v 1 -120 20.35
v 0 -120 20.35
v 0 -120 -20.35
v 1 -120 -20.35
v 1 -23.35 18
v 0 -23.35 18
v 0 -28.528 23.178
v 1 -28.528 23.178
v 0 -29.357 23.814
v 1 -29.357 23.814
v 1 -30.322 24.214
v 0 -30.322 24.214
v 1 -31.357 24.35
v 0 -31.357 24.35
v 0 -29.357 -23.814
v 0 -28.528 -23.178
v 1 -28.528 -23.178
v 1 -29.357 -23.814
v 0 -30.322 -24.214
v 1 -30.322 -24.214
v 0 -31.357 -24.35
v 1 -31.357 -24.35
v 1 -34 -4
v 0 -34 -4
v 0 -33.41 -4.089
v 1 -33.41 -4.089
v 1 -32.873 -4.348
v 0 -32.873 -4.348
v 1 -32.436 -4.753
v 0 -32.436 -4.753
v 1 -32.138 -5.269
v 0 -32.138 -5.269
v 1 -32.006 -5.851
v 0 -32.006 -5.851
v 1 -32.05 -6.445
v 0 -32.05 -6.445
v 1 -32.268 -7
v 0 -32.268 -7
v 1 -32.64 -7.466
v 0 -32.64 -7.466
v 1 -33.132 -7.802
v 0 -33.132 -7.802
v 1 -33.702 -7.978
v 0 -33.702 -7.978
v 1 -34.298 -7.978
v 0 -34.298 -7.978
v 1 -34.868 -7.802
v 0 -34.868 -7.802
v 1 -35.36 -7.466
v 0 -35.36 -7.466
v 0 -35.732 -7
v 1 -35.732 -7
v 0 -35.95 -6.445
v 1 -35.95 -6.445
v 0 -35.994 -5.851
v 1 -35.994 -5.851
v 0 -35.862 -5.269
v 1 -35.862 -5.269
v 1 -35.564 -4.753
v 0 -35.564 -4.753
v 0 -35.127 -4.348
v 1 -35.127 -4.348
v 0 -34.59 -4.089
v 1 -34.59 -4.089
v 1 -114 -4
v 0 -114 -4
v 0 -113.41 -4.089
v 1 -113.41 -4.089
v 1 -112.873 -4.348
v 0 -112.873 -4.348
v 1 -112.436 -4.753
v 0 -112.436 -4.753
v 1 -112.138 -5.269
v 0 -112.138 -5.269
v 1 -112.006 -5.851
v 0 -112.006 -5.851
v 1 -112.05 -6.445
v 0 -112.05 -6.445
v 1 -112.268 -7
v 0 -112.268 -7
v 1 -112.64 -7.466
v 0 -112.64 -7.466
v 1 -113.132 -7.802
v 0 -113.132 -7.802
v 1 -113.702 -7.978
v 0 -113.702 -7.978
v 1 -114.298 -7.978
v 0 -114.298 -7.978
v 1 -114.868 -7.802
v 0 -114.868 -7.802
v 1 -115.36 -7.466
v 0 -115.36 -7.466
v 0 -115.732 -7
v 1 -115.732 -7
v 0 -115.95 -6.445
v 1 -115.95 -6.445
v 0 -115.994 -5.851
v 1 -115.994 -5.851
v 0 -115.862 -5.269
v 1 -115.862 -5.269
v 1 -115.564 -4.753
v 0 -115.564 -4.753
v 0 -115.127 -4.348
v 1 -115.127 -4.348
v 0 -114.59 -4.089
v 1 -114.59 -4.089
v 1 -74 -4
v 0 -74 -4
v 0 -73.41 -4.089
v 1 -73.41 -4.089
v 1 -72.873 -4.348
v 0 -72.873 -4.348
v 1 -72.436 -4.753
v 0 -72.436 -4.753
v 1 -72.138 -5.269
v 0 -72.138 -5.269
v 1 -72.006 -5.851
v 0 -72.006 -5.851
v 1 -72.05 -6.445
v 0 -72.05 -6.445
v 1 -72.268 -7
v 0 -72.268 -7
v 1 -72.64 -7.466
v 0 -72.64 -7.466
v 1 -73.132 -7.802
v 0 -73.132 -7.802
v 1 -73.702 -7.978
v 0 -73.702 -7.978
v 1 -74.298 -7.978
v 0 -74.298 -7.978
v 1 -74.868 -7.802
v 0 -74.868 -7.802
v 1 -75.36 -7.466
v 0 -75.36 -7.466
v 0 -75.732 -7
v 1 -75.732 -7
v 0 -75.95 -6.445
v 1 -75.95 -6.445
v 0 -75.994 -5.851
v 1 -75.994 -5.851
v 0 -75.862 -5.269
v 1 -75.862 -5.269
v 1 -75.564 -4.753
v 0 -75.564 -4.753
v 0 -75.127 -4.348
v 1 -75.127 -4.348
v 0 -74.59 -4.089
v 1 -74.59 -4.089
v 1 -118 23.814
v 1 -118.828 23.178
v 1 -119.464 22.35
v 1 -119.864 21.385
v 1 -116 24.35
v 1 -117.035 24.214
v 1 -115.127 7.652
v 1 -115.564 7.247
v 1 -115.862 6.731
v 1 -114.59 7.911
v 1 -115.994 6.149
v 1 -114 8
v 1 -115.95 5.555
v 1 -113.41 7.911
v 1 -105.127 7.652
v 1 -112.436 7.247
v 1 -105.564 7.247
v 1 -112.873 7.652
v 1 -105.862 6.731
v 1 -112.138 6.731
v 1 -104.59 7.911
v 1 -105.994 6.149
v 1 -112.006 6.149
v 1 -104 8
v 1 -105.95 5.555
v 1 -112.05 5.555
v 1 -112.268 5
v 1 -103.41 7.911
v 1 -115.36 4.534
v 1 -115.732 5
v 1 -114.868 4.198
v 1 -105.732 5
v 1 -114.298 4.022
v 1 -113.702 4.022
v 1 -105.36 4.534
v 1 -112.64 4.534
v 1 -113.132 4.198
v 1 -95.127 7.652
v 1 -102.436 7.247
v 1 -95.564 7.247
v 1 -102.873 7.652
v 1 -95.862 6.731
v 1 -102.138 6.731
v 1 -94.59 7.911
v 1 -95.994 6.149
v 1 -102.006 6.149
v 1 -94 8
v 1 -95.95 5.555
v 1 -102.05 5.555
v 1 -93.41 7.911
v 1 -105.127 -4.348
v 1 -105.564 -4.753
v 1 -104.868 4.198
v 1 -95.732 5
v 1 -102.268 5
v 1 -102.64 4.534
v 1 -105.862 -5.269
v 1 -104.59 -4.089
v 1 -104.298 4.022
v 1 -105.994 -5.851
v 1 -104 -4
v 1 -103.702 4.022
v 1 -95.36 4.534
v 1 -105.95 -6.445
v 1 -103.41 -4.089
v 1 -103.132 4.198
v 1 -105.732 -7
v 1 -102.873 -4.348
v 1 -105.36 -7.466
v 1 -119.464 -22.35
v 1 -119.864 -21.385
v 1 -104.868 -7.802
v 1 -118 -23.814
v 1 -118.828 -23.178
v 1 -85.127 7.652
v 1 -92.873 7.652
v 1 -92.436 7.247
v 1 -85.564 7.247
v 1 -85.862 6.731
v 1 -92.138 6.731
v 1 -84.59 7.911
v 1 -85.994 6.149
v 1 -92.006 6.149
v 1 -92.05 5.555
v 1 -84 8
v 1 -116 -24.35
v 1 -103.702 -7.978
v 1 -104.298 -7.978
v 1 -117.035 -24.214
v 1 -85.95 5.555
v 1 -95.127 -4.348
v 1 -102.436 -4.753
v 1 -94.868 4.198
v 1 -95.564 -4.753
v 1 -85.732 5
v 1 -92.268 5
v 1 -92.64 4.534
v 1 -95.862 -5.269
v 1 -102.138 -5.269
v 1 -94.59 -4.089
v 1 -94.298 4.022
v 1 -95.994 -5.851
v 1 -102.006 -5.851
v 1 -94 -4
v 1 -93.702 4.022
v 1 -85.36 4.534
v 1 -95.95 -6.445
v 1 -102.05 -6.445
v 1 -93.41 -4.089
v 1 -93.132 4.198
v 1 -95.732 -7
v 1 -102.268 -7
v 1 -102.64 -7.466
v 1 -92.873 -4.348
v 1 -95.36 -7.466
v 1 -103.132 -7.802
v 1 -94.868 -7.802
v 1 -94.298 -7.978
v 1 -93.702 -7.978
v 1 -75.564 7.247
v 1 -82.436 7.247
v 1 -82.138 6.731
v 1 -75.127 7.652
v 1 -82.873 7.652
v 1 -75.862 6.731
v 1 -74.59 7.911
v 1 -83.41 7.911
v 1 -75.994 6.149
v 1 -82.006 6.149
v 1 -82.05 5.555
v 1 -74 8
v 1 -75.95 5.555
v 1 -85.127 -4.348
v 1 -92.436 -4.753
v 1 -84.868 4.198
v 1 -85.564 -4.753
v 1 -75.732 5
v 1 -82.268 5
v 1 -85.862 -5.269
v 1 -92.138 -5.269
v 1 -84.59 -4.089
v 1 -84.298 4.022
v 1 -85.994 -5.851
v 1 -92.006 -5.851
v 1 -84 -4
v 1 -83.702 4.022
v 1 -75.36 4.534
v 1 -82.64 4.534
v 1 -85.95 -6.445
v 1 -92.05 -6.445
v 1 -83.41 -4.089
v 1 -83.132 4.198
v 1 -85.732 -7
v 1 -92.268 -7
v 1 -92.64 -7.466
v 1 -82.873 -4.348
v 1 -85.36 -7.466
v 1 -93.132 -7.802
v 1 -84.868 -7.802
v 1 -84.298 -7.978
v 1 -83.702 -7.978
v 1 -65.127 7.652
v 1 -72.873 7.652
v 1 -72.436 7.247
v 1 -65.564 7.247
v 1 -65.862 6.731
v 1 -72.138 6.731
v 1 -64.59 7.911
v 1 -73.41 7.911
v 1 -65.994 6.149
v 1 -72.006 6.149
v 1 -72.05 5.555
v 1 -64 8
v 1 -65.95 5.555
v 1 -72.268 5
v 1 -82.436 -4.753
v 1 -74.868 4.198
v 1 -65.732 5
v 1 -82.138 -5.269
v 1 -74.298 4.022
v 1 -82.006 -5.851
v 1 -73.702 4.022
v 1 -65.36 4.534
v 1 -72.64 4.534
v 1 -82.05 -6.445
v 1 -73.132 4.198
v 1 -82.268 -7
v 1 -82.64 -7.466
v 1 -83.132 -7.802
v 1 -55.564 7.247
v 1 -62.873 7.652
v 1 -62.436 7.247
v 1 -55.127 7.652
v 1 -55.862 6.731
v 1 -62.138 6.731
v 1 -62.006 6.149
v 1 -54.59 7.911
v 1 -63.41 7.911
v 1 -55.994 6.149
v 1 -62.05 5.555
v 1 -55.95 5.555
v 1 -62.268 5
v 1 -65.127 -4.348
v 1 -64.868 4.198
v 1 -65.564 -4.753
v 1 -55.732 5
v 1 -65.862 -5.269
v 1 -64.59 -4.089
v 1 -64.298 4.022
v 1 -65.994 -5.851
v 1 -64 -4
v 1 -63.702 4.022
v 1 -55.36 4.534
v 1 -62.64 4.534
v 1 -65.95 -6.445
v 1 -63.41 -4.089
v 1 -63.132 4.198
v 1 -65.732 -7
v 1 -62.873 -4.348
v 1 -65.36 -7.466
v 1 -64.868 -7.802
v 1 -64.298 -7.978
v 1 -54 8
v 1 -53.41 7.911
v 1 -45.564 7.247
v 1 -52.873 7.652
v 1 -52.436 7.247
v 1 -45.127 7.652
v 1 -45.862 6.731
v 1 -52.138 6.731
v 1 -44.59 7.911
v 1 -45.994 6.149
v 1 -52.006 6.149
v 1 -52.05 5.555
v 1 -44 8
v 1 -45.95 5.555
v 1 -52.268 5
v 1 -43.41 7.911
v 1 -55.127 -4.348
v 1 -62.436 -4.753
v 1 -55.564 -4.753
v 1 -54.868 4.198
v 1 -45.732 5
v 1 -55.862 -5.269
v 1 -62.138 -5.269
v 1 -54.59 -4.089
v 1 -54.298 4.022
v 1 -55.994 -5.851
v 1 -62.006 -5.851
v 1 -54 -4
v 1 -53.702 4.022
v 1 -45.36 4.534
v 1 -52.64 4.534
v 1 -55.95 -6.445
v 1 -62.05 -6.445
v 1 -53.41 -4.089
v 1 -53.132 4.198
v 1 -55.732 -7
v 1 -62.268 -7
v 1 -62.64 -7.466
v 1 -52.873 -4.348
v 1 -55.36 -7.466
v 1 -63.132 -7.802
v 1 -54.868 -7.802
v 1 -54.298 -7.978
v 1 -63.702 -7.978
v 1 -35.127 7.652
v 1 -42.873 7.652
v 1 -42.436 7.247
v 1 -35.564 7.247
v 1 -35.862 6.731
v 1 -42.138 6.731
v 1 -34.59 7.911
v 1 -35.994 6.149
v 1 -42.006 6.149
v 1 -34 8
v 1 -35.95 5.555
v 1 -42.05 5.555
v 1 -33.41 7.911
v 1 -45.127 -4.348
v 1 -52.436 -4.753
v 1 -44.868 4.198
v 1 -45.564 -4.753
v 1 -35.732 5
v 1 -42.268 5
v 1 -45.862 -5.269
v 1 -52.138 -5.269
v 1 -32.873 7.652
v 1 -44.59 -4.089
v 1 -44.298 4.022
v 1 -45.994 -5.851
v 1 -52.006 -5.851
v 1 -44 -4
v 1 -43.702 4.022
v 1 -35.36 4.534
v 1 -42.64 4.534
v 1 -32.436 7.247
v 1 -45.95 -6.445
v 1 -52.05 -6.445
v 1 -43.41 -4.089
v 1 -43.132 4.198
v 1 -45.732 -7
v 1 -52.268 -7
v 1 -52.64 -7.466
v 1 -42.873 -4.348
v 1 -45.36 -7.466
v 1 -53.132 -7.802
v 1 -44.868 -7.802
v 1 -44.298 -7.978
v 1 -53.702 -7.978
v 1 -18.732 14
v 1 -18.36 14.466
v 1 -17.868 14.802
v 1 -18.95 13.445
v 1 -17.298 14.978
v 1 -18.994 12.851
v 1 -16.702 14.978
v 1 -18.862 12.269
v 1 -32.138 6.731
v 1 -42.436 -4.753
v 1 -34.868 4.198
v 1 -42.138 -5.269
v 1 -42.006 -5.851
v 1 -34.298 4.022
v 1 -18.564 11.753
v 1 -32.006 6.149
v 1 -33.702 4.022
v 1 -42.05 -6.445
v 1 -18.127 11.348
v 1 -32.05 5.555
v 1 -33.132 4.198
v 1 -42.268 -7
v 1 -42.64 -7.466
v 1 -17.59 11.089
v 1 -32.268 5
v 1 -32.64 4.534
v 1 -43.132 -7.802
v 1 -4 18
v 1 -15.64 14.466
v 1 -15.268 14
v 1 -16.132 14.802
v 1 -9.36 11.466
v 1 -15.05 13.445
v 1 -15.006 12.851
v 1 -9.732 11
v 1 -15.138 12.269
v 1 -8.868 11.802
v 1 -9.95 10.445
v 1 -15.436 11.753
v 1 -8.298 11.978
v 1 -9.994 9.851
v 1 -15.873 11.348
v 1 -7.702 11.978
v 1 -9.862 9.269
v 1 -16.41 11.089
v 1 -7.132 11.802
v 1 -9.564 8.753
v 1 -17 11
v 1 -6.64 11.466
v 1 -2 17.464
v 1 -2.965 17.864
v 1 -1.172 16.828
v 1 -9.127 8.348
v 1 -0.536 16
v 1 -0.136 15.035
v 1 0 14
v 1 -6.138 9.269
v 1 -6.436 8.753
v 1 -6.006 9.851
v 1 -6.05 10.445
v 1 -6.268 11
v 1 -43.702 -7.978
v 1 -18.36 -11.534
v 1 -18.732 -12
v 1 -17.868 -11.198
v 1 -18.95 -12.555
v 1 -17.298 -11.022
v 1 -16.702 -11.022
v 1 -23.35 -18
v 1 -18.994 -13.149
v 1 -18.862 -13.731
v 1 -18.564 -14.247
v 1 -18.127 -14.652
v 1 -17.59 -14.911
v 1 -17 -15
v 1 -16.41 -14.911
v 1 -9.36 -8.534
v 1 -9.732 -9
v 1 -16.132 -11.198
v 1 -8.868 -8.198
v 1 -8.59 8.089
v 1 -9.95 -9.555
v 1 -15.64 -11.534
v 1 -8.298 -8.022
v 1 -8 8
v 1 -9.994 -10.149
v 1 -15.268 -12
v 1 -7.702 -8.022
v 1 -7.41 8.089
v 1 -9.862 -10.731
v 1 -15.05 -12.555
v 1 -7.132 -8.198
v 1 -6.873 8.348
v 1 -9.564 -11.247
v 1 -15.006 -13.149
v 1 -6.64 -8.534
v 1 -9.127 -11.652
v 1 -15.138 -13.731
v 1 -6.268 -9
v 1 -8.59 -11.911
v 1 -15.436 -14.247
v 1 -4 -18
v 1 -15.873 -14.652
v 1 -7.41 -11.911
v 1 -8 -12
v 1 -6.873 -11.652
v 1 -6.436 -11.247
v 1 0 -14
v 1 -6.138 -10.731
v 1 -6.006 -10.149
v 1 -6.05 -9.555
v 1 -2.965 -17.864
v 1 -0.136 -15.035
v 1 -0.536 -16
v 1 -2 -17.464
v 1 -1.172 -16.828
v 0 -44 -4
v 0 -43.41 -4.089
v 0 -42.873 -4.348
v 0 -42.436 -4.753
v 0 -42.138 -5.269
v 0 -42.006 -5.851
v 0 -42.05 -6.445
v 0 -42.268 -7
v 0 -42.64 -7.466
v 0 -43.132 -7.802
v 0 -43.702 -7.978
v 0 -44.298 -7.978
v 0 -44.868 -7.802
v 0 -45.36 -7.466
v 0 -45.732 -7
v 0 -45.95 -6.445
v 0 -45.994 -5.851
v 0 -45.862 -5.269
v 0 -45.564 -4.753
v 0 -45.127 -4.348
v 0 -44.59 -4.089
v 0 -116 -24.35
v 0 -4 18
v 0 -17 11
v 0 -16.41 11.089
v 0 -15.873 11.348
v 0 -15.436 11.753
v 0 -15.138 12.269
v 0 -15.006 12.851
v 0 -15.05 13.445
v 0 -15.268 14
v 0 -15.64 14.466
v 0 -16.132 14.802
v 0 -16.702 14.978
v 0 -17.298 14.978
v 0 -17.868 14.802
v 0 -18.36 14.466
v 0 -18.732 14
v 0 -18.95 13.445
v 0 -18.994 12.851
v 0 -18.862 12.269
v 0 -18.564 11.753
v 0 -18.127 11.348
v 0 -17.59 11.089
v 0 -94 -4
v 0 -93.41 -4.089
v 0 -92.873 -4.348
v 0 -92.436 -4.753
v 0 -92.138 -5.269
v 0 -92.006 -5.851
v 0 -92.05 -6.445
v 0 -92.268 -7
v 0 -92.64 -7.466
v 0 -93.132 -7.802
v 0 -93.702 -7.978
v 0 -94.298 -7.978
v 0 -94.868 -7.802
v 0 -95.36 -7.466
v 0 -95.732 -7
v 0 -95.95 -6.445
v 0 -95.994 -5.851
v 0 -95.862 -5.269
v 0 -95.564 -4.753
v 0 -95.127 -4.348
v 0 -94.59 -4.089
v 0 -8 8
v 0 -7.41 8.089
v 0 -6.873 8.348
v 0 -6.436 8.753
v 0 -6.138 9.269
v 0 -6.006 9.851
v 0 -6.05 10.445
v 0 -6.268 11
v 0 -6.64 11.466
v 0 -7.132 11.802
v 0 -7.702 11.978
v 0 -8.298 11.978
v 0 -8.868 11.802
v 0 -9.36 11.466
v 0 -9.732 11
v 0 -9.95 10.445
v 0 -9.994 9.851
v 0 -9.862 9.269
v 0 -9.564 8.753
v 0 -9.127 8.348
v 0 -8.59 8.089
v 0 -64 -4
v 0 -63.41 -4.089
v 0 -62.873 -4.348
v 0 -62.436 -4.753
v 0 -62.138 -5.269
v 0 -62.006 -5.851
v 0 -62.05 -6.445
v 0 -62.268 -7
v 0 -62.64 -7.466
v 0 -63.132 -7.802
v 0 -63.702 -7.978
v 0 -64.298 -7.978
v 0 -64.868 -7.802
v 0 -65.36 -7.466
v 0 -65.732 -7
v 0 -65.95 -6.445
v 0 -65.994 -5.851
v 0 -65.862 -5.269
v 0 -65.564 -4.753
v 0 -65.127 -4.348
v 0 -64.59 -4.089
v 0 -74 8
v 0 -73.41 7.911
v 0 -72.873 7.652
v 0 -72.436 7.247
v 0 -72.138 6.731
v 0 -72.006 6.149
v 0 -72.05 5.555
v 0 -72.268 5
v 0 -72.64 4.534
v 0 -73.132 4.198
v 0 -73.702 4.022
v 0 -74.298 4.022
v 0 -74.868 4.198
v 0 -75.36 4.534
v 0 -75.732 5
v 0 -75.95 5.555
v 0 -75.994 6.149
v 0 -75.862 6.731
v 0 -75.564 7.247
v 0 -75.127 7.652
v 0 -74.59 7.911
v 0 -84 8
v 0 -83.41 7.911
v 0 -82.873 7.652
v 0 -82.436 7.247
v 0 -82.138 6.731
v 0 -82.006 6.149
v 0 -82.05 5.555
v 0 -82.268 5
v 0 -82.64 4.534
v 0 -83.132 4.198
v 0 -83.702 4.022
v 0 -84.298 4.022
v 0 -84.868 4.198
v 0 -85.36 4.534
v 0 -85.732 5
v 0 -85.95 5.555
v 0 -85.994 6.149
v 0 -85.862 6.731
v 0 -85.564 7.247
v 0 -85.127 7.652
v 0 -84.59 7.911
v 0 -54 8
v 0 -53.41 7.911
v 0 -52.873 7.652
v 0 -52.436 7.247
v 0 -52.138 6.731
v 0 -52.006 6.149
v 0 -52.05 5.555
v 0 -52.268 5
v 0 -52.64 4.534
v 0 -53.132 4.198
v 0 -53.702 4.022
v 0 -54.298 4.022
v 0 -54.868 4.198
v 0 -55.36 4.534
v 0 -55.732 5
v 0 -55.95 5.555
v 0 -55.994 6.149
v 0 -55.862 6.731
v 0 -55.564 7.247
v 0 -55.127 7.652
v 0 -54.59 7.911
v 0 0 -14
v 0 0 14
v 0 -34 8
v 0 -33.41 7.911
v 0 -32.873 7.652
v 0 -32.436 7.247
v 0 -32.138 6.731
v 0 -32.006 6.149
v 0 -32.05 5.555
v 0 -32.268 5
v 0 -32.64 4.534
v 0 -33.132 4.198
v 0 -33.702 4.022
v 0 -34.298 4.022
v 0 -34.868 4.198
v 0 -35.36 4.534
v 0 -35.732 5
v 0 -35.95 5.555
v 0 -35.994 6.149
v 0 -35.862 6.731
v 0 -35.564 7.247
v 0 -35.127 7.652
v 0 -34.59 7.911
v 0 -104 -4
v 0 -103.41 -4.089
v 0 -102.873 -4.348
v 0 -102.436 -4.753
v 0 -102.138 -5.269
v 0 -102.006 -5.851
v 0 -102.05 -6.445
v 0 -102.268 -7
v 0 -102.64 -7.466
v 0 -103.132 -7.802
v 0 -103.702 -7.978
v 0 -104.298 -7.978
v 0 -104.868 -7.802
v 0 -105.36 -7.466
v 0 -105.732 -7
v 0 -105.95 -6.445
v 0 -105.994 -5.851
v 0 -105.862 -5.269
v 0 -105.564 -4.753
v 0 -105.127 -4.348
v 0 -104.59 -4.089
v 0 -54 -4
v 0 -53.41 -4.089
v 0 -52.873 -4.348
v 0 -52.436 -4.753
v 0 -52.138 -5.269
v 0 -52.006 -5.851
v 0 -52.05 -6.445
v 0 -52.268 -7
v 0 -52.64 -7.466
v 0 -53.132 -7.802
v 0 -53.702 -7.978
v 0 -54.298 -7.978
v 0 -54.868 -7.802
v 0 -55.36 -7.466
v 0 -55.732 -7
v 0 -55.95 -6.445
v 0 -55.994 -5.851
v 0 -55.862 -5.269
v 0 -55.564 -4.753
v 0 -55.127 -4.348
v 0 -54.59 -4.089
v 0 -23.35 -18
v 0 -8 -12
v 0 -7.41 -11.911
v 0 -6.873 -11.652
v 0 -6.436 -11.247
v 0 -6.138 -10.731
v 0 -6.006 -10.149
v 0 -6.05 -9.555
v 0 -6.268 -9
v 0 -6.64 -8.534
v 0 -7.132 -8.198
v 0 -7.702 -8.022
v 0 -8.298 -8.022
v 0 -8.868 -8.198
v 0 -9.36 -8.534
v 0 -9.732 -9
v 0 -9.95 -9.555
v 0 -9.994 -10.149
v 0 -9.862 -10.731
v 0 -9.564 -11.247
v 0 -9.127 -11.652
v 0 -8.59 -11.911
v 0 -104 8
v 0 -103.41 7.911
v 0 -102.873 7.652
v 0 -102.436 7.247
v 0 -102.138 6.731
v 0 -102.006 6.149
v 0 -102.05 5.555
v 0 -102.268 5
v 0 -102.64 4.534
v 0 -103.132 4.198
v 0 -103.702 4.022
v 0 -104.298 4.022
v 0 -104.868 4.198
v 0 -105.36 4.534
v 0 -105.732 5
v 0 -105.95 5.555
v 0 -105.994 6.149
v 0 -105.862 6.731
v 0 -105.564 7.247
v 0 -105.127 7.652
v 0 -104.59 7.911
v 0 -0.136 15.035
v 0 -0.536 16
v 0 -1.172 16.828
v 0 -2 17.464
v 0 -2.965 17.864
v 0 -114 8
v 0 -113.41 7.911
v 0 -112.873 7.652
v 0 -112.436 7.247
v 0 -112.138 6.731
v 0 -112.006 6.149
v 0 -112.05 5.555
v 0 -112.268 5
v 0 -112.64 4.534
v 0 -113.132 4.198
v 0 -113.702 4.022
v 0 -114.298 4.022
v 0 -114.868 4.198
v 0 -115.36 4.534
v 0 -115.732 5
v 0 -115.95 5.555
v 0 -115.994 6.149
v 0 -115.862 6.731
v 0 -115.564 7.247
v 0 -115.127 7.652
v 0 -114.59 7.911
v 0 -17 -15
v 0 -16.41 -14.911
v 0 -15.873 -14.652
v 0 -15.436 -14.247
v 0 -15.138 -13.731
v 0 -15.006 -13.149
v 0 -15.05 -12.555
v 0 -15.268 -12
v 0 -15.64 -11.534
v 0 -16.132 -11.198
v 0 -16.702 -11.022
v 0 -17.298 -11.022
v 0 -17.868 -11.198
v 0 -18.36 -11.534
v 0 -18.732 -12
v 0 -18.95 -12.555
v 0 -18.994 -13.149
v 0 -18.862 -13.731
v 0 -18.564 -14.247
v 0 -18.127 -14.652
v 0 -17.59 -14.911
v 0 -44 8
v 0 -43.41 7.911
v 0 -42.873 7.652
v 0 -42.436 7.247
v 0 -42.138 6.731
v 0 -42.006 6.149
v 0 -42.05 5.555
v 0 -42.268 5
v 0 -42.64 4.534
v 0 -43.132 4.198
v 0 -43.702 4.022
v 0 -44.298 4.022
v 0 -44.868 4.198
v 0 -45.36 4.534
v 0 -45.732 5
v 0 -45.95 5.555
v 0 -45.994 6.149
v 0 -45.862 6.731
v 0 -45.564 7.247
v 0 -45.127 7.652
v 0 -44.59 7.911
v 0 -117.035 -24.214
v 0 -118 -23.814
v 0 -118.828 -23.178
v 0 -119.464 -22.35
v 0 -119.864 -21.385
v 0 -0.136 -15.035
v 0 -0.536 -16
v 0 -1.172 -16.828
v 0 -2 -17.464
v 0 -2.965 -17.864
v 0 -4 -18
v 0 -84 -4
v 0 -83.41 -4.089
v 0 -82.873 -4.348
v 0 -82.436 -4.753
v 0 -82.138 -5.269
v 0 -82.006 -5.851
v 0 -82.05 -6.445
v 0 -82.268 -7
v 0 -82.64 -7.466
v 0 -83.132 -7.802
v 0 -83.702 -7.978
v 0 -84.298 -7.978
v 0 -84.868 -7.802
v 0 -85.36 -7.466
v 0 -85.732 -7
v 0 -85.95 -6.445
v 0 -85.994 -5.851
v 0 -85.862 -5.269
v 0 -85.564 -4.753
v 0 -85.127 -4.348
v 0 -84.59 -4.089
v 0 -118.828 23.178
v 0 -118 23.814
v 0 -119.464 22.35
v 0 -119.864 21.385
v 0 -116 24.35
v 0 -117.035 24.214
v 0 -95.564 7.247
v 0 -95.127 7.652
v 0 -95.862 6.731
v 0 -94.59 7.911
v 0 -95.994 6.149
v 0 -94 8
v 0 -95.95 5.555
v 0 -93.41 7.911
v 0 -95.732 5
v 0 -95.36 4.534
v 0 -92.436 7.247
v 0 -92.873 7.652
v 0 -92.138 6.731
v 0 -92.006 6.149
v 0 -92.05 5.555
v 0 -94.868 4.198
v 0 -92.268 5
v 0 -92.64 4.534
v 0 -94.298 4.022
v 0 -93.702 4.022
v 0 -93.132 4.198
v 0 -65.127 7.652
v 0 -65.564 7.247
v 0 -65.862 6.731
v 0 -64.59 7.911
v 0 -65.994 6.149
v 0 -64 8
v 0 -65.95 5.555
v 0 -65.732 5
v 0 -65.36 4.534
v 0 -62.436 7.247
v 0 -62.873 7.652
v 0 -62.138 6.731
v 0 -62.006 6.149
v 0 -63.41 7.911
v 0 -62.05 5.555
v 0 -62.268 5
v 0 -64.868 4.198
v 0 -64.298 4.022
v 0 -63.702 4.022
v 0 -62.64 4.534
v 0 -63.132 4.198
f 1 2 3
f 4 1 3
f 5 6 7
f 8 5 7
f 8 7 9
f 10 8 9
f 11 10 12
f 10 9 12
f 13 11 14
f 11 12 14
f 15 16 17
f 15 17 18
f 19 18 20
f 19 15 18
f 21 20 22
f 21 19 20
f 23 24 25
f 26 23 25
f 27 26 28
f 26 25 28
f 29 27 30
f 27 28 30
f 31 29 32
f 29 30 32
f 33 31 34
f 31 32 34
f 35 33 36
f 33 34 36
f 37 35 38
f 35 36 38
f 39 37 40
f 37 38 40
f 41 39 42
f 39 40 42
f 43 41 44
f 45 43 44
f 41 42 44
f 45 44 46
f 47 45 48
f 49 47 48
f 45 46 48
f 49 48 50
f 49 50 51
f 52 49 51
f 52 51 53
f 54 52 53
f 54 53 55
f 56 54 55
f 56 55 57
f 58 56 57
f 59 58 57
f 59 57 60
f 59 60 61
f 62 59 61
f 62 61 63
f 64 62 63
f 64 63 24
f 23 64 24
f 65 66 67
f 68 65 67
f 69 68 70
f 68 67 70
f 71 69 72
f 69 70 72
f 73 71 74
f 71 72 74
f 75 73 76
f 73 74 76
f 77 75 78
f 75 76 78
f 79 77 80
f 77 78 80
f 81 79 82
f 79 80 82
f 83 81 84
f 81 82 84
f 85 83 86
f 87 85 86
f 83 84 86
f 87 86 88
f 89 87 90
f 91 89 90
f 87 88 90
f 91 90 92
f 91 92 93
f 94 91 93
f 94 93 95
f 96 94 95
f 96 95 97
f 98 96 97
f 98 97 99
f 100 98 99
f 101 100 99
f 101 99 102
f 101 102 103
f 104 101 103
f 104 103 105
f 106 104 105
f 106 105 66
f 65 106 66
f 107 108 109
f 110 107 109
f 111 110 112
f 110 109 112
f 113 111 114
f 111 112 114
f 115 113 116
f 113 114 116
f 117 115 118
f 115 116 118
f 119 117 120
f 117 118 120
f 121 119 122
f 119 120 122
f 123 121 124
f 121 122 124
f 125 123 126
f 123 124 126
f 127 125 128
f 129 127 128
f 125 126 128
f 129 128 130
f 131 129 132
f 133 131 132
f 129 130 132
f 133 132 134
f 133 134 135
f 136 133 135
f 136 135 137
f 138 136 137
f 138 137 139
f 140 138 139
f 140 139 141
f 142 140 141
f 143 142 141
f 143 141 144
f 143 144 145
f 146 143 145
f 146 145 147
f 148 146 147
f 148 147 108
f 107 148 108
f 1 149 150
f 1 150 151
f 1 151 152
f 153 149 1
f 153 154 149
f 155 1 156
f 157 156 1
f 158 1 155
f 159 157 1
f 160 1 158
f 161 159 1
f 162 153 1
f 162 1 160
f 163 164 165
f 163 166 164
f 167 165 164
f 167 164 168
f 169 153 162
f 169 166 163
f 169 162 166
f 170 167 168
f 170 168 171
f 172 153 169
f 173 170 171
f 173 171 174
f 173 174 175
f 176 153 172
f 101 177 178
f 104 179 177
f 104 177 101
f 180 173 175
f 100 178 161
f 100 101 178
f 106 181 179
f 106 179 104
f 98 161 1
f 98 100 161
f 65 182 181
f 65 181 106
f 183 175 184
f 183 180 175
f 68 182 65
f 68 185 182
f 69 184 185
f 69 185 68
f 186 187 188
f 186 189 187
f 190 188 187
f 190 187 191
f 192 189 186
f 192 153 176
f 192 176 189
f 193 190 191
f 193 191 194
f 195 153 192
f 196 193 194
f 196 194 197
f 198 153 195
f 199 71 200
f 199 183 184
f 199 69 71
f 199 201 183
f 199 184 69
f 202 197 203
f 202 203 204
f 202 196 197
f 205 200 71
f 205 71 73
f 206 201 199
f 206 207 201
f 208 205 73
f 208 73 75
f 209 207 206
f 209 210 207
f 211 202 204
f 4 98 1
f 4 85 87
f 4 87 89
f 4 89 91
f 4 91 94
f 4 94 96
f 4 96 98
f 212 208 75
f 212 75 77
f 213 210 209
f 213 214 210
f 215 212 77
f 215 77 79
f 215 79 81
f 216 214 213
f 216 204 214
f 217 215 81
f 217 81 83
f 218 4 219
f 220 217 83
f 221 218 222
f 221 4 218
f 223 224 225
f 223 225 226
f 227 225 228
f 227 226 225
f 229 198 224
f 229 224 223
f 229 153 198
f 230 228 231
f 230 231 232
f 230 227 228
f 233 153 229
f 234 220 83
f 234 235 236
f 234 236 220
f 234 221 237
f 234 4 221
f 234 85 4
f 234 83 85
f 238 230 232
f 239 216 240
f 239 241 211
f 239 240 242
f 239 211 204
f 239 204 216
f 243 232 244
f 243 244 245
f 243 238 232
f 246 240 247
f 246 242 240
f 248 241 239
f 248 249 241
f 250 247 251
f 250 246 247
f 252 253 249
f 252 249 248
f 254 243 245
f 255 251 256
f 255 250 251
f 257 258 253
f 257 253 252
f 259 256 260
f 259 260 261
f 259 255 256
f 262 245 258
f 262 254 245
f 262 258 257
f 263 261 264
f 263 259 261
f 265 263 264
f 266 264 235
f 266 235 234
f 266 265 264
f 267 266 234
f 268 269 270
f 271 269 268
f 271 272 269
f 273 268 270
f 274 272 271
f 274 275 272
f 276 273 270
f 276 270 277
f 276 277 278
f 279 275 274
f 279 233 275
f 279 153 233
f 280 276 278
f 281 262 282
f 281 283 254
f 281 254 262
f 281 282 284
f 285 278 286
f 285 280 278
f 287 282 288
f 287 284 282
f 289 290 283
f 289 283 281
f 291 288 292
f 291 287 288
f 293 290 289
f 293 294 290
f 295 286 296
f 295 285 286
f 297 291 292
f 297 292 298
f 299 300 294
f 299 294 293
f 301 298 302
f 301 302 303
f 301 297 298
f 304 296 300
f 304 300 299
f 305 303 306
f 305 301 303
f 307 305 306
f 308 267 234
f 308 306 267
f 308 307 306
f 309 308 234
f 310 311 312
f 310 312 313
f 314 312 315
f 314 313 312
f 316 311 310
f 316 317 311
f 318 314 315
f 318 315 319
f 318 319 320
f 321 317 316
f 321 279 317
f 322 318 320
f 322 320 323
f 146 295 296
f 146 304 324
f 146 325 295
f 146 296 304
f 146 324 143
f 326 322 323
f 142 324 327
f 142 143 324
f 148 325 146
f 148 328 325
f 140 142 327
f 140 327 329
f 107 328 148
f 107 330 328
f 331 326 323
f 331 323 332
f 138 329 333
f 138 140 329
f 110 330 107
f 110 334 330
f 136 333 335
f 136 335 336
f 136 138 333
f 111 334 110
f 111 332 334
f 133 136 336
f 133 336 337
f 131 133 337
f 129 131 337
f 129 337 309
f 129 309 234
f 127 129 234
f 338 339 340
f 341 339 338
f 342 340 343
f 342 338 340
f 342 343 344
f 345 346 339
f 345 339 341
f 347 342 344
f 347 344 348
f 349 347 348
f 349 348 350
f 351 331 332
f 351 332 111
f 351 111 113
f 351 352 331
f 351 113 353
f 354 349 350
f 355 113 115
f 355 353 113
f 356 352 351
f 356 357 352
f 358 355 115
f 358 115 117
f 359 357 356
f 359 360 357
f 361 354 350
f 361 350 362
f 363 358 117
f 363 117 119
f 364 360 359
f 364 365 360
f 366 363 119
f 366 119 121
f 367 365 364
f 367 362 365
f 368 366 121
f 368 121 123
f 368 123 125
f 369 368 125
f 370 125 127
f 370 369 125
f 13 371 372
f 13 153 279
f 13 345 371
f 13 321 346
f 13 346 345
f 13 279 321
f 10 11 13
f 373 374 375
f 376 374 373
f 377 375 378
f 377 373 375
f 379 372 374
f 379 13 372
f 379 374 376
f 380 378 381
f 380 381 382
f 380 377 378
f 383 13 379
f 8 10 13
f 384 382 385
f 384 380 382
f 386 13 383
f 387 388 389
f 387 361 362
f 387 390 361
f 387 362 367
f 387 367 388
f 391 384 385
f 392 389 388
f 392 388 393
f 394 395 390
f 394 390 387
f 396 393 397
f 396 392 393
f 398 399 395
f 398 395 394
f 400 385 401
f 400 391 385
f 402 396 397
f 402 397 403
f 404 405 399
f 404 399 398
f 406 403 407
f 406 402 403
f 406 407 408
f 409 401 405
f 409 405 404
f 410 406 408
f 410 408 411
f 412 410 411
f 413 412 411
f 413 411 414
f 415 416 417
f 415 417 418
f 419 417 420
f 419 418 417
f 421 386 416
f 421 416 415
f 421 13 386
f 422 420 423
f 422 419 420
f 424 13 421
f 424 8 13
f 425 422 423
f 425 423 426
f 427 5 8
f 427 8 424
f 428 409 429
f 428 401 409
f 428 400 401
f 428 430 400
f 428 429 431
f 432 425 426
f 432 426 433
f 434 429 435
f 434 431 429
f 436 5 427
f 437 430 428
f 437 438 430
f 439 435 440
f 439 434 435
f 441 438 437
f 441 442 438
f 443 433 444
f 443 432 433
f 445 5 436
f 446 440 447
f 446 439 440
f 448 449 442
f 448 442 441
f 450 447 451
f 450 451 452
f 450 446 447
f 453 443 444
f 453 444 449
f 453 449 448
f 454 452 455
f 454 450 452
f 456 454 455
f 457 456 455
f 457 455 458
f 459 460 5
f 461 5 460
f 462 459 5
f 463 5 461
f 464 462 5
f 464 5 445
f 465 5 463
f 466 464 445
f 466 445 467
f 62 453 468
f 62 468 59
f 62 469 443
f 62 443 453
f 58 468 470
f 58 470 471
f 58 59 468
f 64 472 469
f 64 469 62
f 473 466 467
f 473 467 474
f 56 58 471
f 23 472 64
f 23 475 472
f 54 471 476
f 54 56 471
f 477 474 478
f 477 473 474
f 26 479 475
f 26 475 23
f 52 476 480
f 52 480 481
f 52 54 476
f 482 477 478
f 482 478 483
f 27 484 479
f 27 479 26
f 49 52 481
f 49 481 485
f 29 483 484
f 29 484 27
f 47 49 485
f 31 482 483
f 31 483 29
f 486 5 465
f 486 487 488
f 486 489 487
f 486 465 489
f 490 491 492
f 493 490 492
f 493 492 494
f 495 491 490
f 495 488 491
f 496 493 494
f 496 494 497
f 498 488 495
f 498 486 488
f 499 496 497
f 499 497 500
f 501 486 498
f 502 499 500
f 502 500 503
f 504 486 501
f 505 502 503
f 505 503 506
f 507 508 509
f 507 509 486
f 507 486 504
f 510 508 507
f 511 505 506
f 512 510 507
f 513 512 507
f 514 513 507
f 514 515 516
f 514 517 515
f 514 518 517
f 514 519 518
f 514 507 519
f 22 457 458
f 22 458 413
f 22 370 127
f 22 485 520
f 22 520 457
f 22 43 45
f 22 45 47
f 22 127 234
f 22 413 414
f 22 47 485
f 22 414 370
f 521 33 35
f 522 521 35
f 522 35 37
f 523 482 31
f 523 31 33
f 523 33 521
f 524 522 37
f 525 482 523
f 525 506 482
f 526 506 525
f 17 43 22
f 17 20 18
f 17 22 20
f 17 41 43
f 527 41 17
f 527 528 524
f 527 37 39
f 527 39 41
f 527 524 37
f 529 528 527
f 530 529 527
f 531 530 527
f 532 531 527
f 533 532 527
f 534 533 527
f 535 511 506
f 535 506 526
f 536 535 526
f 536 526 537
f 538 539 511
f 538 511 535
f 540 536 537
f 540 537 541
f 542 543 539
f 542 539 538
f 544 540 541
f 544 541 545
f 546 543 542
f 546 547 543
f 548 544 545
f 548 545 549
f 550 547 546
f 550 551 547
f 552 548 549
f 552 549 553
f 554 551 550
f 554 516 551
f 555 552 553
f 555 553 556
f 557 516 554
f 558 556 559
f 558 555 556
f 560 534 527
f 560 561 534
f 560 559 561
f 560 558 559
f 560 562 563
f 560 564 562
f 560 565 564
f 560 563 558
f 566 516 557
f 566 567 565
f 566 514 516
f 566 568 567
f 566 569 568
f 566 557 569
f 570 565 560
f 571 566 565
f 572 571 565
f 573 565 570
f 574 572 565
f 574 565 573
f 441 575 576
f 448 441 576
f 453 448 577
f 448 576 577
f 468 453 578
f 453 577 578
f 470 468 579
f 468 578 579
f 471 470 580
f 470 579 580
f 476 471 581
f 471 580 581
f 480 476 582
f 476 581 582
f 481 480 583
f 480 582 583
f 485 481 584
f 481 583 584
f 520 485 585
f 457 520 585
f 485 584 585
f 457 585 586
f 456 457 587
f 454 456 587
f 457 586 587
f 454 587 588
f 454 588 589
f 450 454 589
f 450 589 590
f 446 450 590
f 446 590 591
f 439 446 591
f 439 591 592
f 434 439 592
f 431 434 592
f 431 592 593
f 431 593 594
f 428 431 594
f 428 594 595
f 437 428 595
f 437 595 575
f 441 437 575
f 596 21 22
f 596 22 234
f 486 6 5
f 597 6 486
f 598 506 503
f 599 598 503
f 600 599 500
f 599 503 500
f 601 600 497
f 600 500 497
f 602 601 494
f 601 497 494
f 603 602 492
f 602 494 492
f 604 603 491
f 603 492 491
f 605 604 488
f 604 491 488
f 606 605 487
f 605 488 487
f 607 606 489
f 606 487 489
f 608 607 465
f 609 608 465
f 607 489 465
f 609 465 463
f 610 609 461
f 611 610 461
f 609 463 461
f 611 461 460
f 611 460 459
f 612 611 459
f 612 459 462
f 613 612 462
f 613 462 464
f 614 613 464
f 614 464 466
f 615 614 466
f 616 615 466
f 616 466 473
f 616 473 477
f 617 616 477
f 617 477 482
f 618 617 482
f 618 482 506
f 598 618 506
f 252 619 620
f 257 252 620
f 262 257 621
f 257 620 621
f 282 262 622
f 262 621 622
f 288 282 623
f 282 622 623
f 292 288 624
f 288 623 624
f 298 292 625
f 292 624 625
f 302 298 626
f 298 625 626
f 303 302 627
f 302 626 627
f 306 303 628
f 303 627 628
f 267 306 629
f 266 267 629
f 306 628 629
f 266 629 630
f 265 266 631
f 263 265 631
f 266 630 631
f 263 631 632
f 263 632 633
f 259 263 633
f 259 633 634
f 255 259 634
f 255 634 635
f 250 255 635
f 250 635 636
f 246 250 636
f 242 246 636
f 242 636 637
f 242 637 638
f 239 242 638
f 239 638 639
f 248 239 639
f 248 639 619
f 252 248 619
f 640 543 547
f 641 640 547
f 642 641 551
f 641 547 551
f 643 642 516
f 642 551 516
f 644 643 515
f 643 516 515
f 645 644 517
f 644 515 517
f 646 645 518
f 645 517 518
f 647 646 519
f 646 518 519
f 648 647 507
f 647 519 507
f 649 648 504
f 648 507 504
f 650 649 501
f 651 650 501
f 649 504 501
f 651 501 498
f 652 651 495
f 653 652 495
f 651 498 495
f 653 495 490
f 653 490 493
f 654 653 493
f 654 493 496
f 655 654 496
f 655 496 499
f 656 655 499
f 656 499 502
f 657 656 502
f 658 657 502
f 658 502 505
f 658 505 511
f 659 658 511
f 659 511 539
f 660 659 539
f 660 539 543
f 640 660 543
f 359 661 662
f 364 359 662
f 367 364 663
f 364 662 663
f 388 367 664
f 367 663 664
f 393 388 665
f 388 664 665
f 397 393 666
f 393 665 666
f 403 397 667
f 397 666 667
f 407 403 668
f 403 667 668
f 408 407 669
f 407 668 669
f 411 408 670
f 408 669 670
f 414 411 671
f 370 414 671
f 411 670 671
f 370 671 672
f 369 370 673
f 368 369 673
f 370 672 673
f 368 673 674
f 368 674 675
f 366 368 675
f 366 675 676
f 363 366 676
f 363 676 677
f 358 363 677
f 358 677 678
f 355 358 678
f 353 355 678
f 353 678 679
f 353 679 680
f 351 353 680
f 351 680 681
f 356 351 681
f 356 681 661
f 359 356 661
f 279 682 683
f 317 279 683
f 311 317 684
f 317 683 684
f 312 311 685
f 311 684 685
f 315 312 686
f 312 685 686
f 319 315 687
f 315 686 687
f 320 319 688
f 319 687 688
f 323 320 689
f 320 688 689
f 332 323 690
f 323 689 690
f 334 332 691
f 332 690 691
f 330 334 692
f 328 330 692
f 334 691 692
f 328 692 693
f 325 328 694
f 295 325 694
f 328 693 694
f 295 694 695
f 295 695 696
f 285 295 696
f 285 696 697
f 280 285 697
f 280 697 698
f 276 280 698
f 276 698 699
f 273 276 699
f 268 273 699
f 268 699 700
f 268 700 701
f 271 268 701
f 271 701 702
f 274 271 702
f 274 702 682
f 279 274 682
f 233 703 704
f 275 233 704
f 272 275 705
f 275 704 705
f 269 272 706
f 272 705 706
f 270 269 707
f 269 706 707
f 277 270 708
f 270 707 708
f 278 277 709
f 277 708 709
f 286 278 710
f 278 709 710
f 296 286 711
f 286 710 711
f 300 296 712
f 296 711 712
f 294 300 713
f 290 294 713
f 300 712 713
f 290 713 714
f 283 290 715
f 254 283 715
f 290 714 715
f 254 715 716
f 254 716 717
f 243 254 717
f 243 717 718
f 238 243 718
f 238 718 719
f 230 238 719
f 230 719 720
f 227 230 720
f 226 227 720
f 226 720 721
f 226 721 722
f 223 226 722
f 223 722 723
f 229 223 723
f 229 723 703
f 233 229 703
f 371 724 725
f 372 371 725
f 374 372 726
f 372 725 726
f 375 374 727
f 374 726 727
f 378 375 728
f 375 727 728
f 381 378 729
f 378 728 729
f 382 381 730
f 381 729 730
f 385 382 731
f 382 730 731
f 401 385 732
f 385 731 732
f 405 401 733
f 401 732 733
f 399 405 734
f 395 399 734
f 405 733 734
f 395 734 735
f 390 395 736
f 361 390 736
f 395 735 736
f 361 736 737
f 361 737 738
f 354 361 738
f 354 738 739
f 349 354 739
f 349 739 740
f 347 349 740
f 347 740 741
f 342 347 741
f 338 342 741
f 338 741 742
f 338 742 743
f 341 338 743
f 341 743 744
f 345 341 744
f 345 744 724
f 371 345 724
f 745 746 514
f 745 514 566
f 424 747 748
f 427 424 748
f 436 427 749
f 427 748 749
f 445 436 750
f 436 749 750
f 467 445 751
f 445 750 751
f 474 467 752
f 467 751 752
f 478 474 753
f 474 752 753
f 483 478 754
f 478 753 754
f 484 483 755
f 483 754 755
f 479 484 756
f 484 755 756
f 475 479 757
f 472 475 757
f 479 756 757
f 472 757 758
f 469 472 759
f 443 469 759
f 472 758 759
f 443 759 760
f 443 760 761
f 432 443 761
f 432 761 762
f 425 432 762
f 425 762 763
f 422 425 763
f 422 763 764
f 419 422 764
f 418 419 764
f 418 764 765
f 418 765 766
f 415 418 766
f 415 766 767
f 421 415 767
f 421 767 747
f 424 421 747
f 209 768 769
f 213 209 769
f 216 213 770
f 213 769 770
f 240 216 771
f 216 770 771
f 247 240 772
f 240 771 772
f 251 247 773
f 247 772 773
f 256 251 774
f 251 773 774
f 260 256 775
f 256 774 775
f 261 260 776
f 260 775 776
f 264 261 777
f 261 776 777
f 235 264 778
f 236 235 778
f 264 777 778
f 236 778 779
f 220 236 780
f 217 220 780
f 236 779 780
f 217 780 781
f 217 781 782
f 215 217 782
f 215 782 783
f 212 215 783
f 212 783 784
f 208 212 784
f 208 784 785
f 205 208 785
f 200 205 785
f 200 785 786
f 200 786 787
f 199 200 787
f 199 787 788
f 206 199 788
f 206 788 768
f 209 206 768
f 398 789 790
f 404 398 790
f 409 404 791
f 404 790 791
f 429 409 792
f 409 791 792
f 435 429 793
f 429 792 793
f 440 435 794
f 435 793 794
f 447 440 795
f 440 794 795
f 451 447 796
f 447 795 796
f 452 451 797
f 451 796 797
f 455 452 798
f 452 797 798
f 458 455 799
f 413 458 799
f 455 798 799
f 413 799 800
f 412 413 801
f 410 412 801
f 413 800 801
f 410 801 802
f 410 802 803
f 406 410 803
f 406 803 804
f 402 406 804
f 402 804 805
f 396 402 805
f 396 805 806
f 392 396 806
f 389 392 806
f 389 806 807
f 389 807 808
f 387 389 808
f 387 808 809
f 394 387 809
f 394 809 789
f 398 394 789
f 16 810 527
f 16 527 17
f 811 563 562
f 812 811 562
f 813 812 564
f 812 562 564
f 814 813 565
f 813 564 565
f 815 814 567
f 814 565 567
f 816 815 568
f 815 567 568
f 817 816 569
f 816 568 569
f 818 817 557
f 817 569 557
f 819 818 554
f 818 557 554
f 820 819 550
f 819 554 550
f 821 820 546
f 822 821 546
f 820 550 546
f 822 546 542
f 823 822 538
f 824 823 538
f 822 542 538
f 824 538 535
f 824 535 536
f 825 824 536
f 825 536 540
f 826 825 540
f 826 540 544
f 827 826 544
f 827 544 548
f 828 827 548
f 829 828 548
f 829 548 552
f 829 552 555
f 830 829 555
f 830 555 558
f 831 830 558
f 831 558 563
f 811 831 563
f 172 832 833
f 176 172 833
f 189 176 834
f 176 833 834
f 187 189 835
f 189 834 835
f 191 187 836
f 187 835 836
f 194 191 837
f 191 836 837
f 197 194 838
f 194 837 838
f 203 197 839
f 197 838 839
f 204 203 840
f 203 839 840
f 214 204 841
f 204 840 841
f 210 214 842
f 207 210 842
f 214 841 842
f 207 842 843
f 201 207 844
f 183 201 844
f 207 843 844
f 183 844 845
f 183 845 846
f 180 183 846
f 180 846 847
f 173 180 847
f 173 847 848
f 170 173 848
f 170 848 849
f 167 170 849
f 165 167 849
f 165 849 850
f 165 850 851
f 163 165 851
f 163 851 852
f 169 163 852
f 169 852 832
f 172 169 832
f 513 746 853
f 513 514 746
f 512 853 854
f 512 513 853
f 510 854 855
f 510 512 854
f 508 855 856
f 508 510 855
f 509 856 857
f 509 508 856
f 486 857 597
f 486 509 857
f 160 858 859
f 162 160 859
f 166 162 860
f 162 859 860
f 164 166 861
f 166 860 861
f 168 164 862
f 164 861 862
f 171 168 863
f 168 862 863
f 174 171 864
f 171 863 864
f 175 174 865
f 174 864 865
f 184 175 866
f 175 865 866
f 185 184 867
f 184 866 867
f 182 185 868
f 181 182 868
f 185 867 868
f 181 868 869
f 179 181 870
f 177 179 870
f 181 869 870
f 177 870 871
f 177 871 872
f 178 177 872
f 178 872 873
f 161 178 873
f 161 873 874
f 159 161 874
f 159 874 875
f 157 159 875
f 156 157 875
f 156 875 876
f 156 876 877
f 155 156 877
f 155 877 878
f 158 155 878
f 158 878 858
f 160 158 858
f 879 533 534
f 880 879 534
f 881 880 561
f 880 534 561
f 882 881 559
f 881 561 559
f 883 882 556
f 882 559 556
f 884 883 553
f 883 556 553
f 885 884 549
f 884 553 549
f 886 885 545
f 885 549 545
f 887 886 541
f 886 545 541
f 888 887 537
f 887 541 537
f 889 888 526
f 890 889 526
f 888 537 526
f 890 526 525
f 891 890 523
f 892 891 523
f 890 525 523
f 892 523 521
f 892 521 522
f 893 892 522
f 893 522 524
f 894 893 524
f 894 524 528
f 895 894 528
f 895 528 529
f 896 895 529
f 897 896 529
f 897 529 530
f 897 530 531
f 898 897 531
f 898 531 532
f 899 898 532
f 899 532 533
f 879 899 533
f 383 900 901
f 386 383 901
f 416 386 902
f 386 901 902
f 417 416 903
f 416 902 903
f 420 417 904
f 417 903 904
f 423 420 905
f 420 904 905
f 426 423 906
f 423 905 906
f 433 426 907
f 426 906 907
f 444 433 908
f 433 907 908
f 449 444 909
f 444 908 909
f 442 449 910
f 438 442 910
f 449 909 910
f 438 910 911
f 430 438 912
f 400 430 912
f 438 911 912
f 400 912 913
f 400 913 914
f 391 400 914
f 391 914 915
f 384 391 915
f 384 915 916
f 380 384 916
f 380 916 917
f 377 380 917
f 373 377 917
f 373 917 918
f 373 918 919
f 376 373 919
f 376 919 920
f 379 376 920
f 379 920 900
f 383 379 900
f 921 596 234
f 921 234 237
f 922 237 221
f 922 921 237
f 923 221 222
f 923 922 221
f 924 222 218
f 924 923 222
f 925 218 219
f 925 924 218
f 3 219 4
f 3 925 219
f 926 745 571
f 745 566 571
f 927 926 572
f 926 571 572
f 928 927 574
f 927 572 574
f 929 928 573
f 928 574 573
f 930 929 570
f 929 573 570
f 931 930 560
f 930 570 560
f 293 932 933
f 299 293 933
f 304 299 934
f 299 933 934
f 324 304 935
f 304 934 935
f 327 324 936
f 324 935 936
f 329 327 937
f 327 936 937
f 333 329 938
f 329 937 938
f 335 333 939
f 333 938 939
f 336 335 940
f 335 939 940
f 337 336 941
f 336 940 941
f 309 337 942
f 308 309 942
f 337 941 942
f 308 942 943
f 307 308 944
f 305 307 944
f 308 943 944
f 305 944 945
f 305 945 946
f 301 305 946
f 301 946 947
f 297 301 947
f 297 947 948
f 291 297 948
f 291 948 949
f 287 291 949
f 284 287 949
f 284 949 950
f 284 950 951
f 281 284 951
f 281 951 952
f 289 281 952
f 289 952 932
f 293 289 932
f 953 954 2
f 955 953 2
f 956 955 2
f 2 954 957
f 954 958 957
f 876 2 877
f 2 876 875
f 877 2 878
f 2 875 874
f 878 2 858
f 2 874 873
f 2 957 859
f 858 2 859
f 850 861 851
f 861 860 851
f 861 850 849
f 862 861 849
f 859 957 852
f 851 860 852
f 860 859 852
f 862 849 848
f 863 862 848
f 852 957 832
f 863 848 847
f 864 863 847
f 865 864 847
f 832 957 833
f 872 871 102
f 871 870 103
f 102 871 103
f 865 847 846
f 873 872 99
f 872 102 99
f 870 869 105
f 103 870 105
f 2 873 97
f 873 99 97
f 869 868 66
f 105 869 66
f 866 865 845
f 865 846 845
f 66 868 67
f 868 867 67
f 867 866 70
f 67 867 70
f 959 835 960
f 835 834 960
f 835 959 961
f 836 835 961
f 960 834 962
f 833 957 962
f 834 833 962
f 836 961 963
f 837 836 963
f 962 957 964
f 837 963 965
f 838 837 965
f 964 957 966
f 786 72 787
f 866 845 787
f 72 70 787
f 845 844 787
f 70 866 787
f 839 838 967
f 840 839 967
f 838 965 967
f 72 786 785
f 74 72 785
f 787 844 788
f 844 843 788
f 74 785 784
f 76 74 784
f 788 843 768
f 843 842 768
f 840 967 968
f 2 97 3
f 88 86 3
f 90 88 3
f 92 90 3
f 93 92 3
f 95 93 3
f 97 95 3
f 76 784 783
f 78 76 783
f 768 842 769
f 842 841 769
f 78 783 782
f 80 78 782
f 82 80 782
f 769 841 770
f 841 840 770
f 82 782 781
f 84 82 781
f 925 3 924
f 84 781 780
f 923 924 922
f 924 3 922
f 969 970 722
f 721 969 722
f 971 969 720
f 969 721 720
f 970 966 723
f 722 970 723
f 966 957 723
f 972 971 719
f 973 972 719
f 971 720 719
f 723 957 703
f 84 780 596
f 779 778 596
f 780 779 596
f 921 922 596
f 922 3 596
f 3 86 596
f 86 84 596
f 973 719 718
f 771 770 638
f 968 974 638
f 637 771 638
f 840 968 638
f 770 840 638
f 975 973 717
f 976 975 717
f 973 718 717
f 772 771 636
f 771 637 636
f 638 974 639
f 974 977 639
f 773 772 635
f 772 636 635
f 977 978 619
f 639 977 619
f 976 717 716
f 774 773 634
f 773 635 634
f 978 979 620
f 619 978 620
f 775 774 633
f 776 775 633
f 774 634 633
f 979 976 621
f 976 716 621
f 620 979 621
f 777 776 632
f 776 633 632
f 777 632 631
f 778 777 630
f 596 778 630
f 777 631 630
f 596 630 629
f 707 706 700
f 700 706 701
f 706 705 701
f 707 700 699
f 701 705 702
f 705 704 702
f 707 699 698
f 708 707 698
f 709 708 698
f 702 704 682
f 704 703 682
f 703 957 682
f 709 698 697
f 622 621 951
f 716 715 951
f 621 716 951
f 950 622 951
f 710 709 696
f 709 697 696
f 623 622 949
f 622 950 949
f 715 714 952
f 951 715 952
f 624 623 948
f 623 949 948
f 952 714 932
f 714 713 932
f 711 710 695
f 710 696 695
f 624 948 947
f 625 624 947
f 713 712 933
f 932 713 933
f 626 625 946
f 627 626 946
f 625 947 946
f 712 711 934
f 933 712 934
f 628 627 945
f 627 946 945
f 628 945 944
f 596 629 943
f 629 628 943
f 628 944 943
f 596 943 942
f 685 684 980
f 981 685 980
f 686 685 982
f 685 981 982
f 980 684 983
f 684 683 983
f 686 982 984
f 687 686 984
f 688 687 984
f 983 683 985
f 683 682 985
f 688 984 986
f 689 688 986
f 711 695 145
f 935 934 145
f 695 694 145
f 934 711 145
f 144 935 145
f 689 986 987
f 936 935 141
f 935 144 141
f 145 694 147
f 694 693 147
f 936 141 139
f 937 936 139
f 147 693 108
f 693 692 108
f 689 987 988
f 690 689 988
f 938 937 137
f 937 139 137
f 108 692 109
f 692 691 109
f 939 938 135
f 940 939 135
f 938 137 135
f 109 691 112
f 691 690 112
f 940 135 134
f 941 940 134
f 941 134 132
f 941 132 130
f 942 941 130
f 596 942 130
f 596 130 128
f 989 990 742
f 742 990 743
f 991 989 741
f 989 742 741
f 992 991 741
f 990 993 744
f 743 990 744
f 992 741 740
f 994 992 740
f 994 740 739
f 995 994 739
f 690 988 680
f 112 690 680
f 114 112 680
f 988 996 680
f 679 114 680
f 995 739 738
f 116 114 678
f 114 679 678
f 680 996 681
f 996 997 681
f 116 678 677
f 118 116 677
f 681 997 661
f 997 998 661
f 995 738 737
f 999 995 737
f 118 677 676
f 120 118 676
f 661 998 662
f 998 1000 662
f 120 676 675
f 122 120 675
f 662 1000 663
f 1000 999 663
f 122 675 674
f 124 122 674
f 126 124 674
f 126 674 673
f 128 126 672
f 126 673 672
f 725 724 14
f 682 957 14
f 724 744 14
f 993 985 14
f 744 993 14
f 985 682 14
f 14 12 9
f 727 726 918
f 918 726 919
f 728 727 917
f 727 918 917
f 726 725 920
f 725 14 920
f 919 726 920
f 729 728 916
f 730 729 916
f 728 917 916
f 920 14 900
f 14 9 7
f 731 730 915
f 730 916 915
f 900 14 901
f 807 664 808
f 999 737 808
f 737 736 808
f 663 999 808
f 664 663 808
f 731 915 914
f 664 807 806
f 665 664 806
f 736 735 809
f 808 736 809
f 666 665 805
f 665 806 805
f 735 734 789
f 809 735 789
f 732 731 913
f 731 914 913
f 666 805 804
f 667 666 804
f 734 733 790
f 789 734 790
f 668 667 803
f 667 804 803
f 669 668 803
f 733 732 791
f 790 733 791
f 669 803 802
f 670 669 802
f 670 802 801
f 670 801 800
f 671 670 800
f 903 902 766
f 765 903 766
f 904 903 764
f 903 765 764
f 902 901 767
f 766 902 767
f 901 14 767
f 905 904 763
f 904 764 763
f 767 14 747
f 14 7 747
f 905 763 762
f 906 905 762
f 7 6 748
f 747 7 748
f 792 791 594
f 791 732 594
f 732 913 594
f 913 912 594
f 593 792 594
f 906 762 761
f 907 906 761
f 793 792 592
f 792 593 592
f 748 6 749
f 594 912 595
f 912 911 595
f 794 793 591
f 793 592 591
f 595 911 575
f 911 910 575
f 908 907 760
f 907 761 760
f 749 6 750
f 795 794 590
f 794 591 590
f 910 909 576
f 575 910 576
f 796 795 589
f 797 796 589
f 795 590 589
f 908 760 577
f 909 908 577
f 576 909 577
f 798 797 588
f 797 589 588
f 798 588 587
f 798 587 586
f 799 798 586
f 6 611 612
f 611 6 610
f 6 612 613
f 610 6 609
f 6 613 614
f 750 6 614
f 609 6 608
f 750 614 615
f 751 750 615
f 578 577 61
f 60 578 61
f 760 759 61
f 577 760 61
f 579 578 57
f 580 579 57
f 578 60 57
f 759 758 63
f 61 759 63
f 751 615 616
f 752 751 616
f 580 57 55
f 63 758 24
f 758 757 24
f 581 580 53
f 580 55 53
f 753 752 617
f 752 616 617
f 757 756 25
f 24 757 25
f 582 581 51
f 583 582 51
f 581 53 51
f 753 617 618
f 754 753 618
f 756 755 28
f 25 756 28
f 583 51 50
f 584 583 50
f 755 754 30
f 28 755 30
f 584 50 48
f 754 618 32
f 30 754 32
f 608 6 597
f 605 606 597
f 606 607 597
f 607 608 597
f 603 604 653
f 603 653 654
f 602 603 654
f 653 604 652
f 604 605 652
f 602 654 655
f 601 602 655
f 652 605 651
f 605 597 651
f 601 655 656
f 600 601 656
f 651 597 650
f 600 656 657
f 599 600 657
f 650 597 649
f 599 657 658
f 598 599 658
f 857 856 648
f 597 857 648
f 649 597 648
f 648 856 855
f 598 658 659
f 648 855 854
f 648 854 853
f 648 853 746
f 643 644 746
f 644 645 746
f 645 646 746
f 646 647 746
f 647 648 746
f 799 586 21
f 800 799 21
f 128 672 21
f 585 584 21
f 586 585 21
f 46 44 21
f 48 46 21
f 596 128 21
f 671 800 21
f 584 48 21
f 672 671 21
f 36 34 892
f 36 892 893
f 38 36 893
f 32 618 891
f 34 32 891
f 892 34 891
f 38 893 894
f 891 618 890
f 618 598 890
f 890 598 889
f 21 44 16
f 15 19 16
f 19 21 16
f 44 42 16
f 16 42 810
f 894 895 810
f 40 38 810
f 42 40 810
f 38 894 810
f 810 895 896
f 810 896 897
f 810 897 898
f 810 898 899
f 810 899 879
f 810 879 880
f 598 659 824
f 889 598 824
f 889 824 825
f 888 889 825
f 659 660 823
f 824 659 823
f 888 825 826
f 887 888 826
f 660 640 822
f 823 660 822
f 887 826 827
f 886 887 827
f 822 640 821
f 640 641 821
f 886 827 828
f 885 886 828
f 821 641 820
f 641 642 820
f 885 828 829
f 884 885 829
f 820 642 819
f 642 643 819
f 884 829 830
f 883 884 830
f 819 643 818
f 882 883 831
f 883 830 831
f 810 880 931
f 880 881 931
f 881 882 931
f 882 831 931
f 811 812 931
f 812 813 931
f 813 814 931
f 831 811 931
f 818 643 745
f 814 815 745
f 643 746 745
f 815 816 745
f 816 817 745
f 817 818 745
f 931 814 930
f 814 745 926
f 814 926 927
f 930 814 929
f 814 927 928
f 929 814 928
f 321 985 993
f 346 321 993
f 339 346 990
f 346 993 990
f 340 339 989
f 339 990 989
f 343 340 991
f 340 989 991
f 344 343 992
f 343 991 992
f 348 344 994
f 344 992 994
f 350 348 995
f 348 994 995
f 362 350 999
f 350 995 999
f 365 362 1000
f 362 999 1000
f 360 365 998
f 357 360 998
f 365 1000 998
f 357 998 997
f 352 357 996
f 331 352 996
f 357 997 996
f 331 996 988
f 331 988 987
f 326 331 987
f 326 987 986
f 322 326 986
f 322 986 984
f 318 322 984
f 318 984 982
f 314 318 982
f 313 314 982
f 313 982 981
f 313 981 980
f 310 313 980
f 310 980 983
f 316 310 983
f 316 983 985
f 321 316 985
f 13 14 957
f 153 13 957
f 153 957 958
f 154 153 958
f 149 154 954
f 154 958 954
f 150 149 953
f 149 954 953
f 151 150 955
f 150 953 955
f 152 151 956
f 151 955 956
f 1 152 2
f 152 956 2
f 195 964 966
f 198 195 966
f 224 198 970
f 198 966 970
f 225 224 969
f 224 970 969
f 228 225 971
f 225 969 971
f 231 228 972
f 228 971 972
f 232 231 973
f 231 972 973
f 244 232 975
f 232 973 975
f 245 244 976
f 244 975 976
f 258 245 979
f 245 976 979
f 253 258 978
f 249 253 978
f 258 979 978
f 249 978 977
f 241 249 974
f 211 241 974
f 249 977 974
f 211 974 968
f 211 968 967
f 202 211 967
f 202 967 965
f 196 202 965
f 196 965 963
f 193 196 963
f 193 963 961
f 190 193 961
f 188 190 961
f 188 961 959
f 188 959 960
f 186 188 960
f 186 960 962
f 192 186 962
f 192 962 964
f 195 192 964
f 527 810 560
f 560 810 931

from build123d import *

# Parameters (mm, degrees)
SKETCH1_W                = 36
SKETCH1_H                = 120
BOSS_EXTRUDE1_DEPTH      = 1
F_4_0_4_DIAMETER_HOLE2_D = 4
F_4_0_4_DIAMETER_HOLE3_D = 4
F_4_0_4_DIAMETER_HOLE1_D = 4
BOSS_EXTRUDE2_DEPTH      = 1
FILLET1_R                = 4


with BuildPart() as part:
    # Sketch1 → Boss-Extrude1 (new body)
    with BuildSketch(Plane(origin=(0, 0, 0), x_dir=(0, 0, -1), z_dir=(1, 0, 0))):
        with Locations((0, -60)):
            Rectangle(SKETCH1_W, SKETCH1_H)
    extrude(amount=BOSS_EXTRUDE1_DEPTH)

    # Ø4.0 (4) Diameter Hole2 (through all)
    with Locations(Plane.ZY):
        with Locations((-10, -8), (10, -8)):
            Hole(F_4_0_4_DIAMETER_HOLE2_D / 2)

    # Ø4.0 (4) Diameter Hole3 (through all)
    with Locations(Plane.ZY):
        with Locations((-13, -17), (13, -17)):
            Hole(F_4_0_4_DIAMETER_HOLE3_D / 2)

    # Ø4.0 (4) Diameter Hole1 (through all)
    with Locations(Plane(origin=(1, 0, 0), x_dir=(0, 0, -1), z_dir=(1, 0, 0))):
        with Locations((6, -114), (-6, -114), (6, -104), (-6, -104), (6, -94), (-6, -94), (6, -84), (-6, -84), (6, -74), (-6, -74), (6, -64), (-6, -64), (6, -54), (-6, -54), (6, -44), (-6, -44), (6, -34), (-6, -34)):
            Hole(F_4_0_4_DIAMETER_HOLE1_D / 2)

    # Sketch9 → Boss-Extrude2 (add)
    with BuildSketch(Plane.ZY):
        with BuildLine():
            Line((18, -23.35), (23.178427125, -28.528427125))
            ThreePointArc((23.178427125, -28.528427125), (24.04551813, -29.82612052), (24.35, -31.356854249))
            Line((24.35, -31.356854249), (24.35, -116))
            ThreePointArc((24.35, -116), (23.178427125, -118.828427125), (20.35, -120))
            Line((20.35, -120), (18, -120))
            Line((18, -120), (18, -23.35))
        make_face()
        with BuildLine():
            Line((-18, -23.35), (-23.178427125, -28.528427125))
            ThreePointArc((-23.178427125, -28.528427125), (-24.04551813, -29.82612052), (-24.35, -31.356854249))
            Line((-24.35, -31.356854249), (-24.35, -116))
            ThreePointArc((-24.35, -116), (-23.178427125, -118.828427125), (-20.35, -120))
            Line((-20.35, -120), (-18, -120))
            Line((-18, -120), (-18, -23.35))
        make_face()
    extrude(amount=-BOSS_EXTRUDE2_DEPTH)

    # Fillet1
    fillet1_edges = [part.edges().sort_by_distance(p)[0] for p in [
        (0.5, 0, 18),
        (0.5, 0, -18),
    ]]
    fillet(fillet1_edges, radius=FILLET1_R)


solid = part.part
